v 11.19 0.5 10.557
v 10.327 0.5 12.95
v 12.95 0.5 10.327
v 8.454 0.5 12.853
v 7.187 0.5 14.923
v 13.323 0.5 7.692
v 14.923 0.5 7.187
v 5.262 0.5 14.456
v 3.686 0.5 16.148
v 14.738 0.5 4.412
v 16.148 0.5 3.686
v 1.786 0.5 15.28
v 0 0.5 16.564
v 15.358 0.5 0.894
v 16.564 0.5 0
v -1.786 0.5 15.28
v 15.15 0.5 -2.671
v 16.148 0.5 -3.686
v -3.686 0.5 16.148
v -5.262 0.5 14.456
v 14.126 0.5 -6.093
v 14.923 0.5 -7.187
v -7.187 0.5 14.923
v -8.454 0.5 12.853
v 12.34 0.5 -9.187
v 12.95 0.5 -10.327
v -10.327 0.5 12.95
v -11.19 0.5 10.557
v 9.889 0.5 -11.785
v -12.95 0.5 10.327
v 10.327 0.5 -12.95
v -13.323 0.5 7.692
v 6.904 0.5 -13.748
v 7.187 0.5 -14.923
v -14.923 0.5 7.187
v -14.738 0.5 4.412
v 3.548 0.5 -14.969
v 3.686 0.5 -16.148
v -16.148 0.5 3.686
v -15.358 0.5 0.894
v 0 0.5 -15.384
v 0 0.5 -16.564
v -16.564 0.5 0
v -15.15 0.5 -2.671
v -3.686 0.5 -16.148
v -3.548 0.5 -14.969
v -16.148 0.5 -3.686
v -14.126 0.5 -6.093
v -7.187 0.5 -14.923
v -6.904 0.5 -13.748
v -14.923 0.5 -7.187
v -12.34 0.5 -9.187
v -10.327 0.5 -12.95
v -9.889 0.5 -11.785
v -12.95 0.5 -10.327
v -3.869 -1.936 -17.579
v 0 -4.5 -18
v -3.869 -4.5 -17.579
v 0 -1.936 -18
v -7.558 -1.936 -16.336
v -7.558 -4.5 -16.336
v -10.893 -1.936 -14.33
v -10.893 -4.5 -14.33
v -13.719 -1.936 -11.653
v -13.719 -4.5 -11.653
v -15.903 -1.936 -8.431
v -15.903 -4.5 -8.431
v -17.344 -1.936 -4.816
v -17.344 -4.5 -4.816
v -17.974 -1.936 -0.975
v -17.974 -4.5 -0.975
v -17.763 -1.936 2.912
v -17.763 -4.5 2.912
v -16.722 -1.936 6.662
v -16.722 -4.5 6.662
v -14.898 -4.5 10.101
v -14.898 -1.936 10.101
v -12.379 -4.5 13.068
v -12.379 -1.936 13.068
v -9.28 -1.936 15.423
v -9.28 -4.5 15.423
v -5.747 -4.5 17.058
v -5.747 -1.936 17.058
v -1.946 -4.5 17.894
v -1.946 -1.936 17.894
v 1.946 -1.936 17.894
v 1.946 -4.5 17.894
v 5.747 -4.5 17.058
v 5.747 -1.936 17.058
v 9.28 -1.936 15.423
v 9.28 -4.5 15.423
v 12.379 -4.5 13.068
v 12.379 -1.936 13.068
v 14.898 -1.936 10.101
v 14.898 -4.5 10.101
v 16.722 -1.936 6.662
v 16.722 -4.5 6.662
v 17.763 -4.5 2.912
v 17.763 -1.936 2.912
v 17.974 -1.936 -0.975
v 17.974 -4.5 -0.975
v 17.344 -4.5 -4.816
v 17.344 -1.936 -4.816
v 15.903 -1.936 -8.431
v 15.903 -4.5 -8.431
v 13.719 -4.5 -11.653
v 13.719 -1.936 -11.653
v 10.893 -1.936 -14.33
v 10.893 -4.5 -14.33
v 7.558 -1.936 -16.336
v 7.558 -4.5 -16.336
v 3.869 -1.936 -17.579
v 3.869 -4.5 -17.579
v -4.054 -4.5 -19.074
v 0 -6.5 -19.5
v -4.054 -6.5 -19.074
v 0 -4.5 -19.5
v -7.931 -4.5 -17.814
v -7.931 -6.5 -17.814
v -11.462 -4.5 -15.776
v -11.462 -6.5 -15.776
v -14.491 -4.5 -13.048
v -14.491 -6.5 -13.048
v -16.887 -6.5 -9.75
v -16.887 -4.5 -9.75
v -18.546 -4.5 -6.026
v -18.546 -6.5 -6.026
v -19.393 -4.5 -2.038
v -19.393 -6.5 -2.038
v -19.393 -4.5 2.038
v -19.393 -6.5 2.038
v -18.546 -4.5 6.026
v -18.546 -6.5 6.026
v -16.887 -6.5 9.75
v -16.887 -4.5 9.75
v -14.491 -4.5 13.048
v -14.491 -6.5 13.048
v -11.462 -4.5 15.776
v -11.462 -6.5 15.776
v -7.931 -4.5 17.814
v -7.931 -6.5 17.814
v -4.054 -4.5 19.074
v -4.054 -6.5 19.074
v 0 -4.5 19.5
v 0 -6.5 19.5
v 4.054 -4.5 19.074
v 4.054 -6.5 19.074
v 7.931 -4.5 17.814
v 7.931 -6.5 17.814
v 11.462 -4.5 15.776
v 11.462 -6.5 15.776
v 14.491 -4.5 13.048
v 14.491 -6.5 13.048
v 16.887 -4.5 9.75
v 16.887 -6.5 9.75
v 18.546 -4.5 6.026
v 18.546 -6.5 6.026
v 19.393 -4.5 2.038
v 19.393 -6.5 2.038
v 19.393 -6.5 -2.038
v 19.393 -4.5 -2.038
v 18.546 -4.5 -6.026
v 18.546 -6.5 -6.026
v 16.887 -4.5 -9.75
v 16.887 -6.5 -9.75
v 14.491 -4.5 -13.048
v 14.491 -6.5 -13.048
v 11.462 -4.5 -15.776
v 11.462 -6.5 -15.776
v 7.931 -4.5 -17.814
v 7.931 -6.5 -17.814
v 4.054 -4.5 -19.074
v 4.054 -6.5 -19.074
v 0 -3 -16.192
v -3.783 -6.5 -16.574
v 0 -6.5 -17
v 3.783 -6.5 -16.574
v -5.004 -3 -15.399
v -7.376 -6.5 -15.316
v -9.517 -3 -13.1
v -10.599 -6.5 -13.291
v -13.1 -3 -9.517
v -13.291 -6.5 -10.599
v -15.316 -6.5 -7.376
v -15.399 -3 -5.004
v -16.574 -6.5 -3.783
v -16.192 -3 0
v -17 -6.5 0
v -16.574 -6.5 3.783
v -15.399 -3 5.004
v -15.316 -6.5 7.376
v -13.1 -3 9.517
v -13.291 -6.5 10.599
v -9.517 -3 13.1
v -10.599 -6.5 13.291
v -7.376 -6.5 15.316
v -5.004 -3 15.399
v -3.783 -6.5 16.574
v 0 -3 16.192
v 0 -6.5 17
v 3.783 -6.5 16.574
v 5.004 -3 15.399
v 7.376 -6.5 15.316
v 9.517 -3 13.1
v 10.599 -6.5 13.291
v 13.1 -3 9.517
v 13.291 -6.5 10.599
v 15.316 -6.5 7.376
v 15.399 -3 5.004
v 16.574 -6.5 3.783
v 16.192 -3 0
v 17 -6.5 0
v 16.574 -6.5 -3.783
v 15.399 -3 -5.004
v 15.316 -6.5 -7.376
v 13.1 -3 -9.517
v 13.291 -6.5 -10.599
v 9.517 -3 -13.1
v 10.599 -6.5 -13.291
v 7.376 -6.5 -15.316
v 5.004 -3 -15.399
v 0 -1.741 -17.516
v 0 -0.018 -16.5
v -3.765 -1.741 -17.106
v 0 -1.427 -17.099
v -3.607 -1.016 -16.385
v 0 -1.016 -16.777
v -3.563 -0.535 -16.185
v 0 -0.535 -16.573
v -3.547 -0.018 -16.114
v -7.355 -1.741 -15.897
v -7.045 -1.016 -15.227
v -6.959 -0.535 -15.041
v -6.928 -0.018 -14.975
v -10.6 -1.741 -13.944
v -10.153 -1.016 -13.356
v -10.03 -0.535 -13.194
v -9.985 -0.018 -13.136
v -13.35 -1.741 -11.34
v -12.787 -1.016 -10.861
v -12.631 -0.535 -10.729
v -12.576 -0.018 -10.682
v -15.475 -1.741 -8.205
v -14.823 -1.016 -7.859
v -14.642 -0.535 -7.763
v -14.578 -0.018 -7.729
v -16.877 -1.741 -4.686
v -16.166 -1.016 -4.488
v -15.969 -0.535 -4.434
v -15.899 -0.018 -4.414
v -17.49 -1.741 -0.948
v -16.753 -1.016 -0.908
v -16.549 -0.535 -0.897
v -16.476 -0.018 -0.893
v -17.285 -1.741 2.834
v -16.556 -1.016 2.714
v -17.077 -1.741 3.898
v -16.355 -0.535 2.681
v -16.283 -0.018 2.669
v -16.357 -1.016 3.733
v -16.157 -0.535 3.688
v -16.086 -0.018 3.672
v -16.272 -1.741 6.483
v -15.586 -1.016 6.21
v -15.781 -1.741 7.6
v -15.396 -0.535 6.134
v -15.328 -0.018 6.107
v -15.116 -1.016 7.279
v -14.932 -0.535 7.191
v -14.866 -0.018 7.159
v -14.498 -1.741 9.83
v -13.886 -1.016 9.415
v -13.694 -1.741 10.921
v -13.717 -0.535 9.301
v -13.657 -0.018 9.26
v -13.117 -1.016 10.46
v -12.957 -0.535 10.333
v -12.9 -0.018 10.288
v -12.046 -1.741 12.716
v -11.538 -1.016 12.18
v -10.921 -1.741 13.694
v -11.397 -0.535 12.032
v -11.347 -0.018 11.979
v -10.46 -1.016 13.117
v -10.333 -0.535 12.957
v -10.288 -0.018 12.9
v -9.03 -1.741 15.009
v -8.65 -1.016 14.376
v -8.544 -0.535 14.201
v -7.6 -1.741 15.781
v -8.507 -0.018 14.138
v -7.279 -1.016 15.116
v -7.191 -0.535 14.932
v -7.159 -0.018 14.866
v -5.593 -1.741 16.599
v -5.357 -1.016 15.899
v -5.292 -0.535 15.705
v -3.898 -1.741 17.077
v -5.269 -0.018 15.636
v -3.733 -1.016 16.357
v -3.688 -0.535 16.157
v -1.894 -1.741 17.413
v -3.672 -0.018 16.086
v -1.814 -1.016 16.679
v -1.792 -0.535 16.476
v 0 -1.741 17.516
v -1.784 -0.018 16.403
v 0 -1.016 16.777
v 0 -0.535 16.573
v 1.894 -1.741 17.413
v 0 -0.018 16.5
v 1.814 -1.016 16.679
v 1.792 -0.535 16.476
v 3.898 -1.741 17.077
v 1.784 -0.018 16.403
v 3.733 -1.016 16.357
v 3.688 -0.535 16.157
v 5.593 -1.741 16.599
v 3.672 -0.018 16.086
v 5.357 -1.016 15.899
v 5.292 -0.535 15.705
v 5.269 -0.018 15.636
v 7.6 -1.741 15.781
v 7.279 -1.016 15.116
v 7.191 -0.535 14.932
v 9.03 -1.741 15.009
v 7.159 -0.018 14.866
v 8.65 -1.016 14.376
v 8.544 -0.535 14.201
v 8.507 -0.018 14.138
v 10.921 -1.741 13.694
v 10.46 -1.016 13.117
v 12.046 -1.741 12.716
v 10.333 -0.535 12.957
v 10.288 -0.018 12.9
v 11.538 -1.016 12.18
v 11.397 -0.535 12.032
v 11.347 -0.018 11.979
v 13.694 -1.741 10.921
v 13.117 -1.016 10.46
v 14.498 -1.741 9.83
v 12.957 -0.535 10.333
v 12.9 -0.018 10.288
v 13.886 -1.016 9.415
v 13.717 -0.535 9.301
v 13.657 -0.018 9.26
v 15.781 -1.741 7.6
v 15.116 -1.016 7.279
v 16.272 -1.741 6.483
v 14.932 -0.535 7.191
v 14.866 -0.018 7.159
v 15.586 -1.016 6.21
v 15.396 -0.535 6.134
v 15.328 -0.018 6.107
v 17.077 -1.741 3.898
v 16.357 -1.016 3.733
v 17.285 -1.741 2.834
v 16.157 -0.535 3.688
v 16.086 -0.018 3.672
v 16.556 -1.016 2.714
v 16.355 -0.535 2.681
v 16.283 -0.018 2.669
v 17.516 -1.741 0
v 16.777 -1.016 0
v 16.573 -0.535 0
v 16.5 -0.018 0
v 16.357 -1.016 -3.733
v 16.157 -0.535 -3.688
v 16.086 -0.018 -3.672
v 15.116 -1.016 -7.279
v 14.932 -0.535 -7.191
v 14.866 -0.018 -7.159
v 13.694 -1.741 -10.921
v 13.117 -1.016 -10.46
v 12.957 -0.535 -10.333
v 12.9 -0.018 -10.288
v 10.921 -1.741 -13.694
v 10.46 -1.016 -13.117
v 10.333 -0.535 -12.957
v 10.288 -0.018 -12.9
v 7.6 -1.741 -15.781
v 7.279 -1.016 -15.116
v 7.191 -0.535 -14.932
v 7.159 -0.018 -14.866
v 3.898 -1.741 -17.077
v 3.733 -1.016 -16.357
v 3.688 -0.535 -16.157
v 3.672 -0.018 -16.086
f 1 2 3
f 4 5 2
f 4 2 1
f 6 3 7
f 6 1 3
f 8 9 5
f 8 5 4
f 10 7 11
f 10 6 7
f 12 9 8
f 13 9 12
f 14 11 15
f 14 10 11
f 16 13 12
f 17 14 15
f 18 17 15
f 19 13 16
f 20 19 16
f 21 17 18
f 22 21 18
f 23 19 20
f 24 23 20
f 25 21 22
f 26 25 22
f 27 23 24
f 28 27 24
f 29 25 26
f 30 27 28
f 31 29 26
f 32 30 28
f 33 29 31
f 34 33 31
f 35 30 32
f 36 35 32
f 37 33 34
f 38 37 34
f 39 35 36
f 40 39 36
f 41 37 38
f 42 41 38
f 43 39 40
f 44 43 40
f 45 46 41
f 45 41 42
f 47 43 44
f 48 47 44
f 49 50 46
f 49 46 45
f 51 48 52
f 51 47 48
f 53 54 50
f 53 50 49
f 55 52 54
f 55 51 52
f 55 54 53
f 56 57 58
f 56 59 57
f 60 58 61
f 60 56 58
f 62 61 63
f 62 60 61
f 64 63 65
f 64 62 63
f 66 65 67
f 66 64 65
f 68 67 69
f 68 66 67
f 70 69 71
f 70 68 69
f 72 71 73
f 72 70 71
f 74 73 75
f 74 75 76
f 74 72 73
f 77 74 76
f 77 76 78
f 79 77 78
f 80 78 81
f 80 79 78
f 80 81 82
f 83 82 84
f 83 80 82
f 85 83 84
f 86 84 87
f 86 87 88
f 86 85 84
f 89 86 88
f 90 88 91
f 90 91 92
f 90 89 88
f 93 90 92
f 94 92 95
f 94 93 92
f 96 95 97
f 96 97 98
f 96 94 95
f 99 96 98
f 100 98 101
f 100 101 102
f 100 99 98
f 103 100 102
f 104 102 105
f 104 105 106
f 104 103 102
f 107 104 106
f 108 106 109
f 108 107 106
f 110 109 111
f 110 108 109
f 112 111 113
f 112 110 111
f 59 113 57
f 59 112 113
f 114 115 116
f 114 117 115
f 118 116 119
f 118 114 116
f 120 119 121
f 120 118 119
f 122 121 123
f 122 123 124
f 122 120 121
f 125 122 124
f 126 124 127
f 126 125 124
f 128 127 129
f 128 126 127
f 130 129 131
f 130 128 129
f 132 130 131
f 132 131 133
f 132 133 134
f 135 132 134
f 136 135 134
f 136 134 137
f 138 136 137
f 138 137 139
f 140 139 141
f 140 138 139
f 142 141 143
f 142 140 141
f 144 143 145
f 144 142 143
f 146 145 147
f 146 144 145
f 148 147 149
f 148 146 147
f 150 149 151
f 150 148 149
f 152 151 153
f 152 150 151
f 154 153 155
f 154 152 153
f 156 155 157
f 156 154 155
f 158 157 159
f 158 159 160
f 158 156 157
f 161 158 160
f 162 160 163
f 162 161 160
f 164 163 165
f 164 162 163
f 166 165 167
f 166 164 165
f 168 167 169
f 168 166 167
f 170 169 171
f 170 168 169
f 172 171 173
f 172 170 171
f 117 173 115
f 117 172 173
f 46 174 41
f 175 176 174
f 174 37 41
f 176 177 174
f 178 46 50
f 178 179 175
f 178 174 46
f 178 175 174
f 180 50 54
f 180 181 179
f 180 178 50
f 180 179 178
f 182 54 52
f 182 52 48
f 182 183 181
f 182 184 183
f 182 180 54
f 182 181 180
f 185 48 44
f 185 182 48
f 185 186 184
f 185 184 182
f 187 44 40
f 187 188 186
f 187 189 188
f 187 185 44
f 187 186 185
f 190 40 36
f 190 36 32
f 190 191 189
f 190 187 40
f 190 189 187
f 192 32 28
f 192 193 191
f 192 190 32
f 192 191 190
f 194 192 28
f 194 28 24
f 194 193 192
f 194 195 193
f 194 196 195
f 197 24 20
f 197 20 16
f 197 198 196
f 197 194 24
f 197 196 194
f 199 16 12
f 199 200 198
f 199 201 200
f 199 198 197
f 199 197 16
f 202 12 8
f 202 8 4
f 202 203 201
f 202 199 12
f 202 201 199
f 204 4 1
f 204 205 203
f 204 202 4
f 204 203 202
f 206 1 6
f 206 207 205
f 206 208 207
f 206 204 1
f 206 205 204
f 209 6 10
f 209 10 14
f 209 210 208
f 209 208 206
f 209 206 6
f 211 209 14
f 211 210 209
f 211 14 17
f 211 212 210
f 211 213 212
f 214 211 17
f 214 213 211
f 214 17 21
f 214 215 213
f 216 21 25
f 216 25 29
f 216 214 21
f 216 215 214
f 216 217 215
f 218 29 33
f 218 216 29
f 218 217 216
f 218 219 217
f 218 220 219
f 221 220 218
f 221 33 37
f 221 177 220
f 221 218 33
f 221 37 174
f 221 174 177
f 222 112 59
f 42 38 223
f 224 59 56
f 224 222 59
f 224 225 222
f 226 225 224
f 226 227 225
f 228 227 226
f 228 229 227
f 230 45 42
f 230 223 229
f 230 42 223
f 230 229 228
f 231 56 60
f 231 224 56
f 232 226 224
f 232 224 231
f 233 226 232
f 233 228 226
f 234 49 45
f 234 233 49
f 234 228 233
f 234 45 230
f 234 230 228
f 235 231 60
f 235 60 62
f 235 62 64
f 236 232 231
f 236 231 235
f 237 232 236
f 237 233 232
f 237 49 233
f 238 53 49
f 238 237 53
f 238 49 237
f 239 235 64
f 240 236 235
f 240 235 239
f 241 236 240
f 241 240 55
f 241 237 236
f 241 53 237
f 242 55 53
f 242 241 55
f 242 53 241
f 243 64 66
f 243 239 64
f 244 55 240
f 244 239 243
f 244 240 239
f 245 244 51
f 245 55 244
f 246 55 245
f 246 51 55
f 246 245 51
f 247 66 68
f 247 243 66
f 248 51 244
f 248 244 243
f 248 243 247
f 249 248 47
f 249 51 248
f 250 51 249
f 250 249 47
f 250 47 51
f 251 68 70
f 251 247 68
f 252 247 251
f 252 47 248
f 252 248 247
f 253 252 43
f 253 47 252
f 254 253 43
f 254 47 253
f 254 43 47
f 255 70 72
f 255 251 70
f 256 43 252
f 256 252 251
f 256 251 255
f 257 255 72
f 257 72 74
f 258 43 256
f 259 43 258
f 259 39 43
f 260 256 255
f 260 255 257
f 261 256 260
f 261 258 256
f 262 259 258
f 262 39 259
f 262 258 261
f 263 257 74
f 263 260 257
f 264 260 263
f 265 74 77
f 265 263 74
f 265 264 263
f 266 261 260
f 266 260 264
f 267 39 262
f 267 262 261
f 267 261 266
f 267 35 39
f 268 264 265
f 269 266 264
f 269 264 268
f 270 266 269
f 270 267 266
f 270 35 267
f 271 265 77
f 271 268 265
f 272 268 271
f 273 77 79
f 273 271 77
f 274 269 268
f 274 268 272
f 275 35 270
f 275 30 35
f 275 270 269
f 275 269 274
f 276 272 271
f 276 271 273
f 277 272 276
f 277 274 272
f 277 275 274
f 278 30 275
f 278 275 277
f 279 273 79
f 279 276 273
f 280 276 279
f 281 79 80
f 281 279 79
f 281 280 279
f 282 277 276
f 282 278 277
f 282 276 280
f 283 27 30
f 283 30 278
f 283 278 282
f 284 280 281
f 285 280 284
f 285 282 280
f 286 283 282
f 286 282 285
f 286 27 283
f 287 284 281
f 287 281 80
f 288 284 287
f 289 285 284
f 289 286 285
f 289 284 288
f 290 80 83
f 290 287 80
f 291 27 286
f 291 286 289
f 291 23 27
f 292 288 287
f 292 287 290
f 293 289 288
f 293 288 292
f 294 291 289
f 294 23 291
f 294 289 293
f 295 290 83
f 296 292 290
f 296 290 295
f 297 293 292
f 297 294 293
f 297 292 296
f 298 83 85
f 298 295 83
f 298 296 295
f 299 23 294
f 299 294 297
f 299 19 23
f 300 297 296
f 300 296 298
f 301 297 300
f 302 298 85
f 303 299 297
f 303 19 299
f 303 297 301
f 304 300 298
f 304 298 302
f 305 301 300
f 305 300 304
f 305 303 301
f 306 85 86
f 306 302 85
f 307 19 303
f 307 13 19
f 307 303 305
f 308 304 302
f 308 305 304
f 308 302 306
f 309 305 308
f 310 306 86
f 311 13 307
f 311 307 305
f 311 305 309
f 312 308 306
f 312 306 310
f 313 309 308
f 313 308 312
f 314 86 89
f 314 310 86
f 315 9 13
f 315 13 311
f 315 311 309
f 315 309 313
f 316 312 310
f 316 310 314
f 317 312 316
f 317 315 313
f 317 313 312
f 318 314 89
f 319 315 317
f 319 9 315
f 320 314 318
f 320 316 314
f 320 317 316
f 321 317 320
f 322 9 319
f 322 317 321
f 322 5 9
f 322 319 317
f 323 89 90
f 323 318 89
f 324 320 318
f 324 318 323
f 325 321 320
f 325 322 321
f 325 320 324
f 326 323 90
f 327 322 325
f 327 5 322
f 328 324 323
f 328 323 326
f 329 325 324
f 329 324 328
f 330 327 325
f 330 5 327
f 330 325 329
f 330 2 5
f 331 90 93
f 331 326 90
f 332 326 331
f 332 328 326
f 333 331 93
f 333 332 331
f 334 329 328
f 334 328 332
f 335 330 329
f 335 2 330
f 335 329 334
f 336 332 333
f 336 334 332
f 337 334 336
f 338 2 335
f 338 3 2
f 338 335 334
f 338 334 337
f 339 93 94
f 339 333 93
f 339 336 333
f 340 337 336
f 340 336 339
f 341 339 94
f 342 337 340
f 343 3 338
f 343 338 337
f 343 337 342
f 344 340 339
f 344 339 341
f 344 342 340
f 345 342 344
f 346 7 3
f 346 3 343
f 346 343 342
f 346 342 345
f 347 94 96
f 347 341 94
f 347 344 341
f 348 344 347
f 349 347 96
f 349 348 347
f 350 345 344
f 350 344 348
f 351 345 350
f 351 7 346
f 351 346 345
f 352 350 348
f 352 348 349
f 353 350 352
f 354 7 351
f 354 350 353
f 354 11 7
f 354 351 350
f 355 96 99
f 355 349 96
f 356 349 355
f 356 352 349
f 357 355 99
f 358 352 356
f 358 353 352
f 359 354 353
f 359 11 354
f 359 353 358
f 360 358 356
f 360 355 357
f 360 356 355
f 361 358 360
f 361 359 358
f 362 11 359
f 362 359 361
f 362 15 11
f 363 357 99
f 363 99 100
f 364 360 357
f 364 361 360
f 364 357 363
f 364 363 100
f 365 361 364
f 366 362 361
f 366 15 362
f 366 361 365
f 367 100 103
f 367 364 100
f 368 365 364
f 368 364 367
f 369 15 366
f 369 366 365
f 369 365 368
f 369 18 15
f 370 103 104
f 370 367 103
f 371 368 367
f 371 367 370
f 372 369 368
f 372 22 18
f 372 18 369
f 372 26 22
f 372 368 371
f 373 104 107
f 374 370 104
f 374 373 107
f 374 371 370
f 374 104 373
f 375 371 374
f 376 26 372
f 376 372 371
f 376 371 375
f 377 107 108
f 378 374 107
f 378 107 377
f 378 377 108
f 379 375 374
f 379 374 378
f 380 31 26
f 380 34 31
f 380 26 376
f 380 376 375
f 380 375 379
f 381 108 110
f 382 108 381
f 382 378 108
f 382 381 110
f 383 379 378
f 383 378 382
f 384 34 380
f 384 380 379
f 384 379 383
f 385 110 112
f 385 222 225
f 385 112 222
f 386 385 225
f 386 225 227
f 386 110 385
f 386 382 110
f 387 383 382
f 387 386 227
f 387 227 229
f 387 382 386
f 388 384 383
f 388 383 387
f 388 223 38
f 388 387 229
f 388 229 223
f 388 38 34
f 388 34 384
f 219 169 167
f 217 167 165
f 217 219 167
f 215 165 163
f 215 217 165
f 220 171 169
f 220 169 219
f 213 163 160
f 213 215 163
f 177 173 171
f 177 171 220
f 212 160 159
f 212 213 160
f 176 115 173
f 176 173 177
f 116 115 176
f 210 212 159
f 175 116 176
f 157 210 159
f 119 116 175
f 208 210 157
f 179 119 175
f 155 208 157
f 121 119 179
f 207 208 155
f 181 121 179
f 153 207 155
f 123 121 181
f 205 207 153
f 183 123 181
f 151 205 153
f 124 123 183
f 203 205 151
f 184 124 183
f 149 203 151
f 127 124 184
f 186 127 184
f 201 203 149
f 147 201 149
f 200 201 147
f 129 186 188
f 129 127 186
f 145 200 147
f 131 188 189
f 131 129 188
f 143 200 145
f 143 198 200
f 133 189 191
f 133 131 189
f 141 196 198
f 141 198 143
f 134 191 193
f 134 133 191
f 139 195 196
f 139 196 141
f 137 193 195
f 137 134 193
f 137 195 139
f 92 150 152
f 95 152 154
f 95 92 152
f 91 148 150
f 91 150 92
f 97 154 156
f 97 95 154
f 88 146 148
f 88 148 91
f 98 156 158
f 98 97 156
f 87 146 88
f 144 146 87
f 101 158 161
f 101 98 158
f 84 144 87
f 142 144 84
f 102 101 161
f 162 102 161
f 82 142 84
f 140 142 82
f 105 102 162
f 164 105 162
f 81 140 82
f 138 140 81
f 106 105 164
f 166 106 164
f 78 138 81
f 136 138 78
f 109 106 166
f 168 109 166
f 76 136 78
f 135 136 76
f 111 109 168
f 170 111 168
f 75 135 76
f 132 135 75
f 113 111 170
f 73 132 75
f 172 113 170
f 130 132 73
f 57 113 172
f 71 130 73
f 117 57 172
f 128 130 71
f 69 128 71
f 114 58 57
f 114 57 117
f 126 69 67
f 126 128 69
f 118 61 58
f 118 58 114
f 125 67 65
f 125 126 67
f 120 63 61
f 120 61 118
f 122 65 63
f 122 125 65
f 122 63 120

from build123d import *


with BuildPart() as part:
    # Esquisse1 → Révolution1 (revolve)
    with BuildSketch(Plane.XY, mode=Mode.PRIVATE) as r_volution1_sk:
        with BuildLine():
            Line((17, -6.5), (19.5, -6.5))
            Line((19.5, -6.5), (19.5, -4.5))
            Line((19.5, -4.5), (18, -4.5))
            Line((18, -4.5), (18, -1.936491673))
            ThreePointArc((18, -1.936491673), (16.777140216, -1.015753003), (16.563508327, 0.5))
            Line((16.563508327, 0.5), (15.383922662, 0.5))
            Line((15.383922662, 0.5), (17, -6.5))
        make_face()
    revolve(r_volution1_sk.sketch.rotate(Axis((0, -11.232892416, 0), (0, 1, 0)), 90), axis=Axis((0, -11.232892416, 0), (0, 1, 0)))  # turned: the seam where the file's is


solid = part.part
